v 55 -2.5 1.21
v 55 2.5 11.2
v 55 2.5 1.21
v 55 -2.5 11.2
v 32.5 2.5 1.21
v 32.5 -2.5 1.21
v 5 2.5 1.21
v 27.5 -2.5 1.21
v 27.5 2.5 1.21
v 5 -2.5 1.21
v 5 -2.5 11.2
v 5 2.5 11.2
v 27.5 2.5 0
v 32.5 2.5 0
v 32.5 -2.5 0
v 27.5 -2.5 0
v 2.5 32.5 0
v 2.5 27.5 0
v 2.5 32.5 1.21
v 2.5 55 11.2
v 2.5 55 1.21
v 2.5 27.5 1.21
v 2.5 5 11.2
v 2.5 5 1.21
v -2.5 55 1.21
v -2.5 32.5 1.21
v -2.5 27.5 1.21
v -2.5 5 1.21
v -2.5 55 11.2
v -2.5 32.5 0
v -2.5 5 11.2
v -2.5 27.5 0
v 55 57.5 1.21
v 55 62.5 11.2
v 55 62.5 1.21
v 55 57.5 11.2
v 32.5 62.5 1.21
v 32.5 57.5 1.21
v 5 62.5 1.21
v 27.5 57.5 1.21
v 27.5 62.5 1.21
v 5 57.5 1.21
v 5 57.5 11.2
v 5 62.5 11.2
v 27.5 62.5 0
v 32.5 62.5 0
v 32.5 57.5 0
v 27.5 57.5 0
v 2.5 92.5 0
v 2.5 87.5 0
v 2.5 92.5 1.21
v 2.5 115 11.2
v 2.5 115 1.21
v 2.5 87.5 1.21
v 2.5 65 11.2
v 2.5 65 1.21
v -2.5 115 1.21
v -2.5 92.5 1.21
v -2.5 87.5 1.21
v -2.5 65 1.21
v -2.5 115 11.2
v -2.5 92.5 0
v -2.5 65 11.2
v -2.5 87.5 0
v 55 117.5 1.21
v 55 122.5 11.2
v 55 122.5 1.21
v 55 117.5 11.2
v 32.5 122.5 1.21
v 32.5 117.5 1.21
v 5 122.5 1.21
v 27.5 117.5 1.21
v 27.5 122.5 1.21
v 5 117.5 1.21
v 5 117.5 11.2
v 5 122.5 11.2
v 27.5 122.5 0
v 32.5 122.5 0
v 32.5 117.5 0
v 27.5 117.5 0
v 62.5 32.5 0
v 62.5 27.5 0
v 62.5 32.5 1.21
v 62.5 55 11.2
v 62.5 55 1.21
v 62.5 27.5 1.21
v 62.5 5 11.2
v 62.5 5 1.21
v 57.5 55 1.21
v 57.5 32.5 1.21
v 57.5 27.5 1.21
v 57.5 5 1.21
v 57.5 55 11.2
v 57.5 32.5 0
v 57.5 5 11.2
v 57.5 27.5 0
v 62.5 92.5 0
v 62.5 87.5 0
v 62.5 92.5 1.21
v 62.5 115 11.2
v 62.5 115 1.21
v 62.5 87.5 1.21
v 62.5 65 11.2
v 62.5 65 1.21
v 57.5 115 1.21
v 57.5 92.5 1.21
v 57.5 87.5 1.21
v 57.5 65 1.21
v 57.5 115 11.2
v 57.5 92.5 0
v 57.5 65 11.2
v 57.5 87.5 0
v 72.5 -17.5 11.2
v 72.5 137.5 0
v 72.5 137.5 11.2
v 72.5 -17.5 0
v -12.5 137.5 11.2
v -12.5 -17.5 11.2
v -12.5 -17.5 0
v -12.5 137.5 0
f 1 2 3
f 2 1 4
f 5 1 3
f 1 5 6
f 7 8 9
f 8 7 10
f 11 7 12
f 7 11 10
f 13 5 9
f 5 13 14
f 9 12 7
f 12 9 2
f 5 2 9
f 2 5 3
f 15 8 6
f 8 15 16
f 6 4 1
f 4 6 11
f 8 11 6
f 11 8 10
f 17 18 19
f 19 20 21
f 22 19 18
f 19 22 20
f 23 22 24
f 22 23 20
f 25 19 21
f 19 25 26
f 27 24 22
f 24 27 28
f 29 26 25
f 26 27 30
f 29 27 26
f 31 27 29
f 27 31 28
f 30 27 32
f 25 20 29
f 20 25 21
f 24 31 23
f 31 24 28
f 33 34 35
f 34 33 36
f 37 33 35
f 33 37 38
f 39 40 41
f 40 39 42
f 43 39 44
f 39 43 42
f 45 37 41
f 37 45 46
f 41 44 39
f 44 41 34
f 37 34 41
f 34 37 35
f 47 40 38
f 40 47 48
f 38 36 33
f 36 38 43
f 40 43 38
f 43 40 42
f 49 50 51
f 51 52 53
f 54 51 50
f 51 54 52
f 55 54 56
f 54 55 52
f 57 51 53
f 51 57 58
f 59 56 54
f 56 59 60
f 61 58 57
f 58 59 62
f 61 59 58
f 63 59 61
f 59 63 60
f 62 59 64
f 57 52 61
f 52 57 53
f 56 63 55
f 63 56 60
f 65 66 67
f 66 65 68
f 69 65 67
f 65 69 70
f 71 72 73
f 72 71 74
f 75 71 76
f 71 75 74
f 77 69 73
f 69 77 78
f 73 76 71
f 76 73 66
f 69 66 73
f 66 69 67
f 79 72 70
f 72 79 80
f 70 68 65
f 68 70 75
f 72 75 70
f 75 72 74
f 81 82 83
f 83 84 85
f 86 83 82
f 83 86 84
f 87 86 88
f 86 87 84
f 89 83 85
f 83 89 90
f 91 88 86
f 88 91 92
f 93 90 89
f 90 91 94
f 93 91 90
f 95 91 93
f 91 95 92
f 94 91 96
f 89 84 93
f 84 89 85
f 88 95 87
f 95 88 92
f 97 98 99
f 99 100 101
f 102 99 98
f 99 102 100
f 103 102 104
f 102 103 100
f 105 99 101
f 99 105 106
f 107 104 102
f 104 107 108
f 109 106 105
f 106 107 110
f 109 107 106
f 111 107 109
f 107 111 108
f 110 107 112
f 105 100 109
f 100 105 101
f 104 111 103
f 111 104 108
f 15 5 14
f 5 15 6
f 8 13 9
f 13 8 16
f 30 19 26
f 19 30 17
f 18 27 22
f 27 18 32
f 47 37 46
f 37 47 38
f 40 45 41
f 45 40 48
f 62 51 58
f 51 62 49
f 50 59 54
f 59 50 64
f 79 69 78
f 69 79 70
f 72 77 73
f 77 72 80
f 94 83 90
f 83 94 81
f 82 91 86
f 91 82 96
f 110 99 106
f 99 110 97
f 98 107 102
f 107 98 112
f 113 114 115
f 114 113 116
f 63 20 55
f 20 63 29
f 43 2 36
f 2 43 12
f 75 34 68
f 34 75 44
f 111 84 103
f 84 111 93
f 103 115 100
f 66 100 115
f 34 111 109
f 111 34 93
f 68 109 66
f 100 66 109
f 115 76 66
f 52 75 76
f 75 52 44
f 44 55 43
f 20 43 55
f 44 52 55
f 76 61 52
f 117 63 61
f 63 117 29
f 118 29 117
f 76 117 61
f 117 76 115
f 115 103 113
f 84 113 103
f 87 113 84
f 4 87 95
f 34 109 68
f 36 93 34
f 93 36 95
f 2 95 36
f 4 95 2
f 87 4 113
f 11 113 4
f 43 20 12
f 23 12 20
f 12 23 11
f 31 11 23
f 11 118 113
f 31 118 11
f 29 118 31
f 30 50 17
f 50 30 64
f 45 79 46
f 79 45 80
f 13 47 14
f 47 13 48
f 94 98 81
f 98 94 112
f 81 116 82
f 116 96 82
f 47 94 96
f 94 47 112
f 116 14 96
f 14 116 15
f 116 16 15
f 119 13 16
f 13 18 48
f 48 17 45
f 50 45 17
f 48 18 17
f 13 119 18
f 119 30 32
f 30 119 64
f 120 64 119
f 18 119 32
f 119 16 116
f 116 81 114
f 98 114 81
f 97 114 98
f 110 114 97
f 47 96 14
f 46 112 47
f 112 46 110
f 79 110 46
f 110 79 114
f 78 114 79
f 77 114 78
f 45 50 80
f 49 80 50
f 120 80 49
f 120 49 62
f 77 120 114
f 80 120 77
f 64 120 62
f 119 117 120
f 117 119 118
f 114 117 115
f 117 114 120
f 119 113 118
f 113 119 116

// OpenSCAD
// OpenSCAD LED neon 7 segment display cube
// 
// A cube with slots for pieces of LED neon
// as segments of a 7-segment display
//
// ATTENTION:
// This is not a classic LEDneon frame and
// DOES *NOT* USE THE CENTRAL CONFIG FILE
/////////////////////////////////////////////////////////

//Height of a single vertical segment
segh = 50;

//Width of a horizontal segment
segw = 50;

//Thickness of lines of the segment
//i.e., LED neon tape width
segt = 5;

//Gap between segments
segg = 5;

//Depth of the slots
segd = 10;

//Hole offset horizontal
hoh = 25;

//Hole offset vertical
hov = 25;

//Floor height
fl = 1.2;

//Border top and bottom
btb = 15;

//Border left and right
blr = 10;

///////////////////////////
//Prevent planefighting
pf = 0.01;

// mode = 0: generate slots
// mode = 1: generate holes

module onesegh(mode=0) {
    if(mode==0) {
        cube([segw, segt, segd+pf]);
    } else {
        translate([hoh-segt/2,0,-pf])
            cube([segt, segt, fl+3*pf]);
    }        
}

module onesegv(mode=0) {
    if(mode==0) {
        cube([segt, segh, segd+pf]);
    } else {
        translate([0,hov-segt/2,-pf])
            cube([segt, segt, fl+3*pf]);
    }
}

module sevensegslots(mode=0) {
    translate([segg,-segt/2,0])
        onesegh(mode=mode);
    translate([-segt/2,segg,0])
        onesegv(mode=mode);
    translate([segg,segh+2*segg-segt/2,0])
        onesegh(mode=mode);
    translate([-segt/2,segh+3*segg,0])
        onesegv(mode=mode);
    translate([segg,2*segh+4*segg-segt/2,0])
        onesegh(mode=mode);
    translate([segw+2*segg-segt/2,segg,0])
        onesegv(mode=mode);
    translate([segw+2*segg-segt/2,segh+3*segg,0])
        onesegv(mode=mode);
}

difference(){
    translate([-segt/2-blr,-segt/2-btb,0])
        cube([2*blr+segt+segw+2*segg,2*btb+segt+2*segh+4*segg,fl+segd]);
    translate([0,0,fl+pf])
        sevensegslots(mode=0);
    sevensegslots(mode=1);
}
